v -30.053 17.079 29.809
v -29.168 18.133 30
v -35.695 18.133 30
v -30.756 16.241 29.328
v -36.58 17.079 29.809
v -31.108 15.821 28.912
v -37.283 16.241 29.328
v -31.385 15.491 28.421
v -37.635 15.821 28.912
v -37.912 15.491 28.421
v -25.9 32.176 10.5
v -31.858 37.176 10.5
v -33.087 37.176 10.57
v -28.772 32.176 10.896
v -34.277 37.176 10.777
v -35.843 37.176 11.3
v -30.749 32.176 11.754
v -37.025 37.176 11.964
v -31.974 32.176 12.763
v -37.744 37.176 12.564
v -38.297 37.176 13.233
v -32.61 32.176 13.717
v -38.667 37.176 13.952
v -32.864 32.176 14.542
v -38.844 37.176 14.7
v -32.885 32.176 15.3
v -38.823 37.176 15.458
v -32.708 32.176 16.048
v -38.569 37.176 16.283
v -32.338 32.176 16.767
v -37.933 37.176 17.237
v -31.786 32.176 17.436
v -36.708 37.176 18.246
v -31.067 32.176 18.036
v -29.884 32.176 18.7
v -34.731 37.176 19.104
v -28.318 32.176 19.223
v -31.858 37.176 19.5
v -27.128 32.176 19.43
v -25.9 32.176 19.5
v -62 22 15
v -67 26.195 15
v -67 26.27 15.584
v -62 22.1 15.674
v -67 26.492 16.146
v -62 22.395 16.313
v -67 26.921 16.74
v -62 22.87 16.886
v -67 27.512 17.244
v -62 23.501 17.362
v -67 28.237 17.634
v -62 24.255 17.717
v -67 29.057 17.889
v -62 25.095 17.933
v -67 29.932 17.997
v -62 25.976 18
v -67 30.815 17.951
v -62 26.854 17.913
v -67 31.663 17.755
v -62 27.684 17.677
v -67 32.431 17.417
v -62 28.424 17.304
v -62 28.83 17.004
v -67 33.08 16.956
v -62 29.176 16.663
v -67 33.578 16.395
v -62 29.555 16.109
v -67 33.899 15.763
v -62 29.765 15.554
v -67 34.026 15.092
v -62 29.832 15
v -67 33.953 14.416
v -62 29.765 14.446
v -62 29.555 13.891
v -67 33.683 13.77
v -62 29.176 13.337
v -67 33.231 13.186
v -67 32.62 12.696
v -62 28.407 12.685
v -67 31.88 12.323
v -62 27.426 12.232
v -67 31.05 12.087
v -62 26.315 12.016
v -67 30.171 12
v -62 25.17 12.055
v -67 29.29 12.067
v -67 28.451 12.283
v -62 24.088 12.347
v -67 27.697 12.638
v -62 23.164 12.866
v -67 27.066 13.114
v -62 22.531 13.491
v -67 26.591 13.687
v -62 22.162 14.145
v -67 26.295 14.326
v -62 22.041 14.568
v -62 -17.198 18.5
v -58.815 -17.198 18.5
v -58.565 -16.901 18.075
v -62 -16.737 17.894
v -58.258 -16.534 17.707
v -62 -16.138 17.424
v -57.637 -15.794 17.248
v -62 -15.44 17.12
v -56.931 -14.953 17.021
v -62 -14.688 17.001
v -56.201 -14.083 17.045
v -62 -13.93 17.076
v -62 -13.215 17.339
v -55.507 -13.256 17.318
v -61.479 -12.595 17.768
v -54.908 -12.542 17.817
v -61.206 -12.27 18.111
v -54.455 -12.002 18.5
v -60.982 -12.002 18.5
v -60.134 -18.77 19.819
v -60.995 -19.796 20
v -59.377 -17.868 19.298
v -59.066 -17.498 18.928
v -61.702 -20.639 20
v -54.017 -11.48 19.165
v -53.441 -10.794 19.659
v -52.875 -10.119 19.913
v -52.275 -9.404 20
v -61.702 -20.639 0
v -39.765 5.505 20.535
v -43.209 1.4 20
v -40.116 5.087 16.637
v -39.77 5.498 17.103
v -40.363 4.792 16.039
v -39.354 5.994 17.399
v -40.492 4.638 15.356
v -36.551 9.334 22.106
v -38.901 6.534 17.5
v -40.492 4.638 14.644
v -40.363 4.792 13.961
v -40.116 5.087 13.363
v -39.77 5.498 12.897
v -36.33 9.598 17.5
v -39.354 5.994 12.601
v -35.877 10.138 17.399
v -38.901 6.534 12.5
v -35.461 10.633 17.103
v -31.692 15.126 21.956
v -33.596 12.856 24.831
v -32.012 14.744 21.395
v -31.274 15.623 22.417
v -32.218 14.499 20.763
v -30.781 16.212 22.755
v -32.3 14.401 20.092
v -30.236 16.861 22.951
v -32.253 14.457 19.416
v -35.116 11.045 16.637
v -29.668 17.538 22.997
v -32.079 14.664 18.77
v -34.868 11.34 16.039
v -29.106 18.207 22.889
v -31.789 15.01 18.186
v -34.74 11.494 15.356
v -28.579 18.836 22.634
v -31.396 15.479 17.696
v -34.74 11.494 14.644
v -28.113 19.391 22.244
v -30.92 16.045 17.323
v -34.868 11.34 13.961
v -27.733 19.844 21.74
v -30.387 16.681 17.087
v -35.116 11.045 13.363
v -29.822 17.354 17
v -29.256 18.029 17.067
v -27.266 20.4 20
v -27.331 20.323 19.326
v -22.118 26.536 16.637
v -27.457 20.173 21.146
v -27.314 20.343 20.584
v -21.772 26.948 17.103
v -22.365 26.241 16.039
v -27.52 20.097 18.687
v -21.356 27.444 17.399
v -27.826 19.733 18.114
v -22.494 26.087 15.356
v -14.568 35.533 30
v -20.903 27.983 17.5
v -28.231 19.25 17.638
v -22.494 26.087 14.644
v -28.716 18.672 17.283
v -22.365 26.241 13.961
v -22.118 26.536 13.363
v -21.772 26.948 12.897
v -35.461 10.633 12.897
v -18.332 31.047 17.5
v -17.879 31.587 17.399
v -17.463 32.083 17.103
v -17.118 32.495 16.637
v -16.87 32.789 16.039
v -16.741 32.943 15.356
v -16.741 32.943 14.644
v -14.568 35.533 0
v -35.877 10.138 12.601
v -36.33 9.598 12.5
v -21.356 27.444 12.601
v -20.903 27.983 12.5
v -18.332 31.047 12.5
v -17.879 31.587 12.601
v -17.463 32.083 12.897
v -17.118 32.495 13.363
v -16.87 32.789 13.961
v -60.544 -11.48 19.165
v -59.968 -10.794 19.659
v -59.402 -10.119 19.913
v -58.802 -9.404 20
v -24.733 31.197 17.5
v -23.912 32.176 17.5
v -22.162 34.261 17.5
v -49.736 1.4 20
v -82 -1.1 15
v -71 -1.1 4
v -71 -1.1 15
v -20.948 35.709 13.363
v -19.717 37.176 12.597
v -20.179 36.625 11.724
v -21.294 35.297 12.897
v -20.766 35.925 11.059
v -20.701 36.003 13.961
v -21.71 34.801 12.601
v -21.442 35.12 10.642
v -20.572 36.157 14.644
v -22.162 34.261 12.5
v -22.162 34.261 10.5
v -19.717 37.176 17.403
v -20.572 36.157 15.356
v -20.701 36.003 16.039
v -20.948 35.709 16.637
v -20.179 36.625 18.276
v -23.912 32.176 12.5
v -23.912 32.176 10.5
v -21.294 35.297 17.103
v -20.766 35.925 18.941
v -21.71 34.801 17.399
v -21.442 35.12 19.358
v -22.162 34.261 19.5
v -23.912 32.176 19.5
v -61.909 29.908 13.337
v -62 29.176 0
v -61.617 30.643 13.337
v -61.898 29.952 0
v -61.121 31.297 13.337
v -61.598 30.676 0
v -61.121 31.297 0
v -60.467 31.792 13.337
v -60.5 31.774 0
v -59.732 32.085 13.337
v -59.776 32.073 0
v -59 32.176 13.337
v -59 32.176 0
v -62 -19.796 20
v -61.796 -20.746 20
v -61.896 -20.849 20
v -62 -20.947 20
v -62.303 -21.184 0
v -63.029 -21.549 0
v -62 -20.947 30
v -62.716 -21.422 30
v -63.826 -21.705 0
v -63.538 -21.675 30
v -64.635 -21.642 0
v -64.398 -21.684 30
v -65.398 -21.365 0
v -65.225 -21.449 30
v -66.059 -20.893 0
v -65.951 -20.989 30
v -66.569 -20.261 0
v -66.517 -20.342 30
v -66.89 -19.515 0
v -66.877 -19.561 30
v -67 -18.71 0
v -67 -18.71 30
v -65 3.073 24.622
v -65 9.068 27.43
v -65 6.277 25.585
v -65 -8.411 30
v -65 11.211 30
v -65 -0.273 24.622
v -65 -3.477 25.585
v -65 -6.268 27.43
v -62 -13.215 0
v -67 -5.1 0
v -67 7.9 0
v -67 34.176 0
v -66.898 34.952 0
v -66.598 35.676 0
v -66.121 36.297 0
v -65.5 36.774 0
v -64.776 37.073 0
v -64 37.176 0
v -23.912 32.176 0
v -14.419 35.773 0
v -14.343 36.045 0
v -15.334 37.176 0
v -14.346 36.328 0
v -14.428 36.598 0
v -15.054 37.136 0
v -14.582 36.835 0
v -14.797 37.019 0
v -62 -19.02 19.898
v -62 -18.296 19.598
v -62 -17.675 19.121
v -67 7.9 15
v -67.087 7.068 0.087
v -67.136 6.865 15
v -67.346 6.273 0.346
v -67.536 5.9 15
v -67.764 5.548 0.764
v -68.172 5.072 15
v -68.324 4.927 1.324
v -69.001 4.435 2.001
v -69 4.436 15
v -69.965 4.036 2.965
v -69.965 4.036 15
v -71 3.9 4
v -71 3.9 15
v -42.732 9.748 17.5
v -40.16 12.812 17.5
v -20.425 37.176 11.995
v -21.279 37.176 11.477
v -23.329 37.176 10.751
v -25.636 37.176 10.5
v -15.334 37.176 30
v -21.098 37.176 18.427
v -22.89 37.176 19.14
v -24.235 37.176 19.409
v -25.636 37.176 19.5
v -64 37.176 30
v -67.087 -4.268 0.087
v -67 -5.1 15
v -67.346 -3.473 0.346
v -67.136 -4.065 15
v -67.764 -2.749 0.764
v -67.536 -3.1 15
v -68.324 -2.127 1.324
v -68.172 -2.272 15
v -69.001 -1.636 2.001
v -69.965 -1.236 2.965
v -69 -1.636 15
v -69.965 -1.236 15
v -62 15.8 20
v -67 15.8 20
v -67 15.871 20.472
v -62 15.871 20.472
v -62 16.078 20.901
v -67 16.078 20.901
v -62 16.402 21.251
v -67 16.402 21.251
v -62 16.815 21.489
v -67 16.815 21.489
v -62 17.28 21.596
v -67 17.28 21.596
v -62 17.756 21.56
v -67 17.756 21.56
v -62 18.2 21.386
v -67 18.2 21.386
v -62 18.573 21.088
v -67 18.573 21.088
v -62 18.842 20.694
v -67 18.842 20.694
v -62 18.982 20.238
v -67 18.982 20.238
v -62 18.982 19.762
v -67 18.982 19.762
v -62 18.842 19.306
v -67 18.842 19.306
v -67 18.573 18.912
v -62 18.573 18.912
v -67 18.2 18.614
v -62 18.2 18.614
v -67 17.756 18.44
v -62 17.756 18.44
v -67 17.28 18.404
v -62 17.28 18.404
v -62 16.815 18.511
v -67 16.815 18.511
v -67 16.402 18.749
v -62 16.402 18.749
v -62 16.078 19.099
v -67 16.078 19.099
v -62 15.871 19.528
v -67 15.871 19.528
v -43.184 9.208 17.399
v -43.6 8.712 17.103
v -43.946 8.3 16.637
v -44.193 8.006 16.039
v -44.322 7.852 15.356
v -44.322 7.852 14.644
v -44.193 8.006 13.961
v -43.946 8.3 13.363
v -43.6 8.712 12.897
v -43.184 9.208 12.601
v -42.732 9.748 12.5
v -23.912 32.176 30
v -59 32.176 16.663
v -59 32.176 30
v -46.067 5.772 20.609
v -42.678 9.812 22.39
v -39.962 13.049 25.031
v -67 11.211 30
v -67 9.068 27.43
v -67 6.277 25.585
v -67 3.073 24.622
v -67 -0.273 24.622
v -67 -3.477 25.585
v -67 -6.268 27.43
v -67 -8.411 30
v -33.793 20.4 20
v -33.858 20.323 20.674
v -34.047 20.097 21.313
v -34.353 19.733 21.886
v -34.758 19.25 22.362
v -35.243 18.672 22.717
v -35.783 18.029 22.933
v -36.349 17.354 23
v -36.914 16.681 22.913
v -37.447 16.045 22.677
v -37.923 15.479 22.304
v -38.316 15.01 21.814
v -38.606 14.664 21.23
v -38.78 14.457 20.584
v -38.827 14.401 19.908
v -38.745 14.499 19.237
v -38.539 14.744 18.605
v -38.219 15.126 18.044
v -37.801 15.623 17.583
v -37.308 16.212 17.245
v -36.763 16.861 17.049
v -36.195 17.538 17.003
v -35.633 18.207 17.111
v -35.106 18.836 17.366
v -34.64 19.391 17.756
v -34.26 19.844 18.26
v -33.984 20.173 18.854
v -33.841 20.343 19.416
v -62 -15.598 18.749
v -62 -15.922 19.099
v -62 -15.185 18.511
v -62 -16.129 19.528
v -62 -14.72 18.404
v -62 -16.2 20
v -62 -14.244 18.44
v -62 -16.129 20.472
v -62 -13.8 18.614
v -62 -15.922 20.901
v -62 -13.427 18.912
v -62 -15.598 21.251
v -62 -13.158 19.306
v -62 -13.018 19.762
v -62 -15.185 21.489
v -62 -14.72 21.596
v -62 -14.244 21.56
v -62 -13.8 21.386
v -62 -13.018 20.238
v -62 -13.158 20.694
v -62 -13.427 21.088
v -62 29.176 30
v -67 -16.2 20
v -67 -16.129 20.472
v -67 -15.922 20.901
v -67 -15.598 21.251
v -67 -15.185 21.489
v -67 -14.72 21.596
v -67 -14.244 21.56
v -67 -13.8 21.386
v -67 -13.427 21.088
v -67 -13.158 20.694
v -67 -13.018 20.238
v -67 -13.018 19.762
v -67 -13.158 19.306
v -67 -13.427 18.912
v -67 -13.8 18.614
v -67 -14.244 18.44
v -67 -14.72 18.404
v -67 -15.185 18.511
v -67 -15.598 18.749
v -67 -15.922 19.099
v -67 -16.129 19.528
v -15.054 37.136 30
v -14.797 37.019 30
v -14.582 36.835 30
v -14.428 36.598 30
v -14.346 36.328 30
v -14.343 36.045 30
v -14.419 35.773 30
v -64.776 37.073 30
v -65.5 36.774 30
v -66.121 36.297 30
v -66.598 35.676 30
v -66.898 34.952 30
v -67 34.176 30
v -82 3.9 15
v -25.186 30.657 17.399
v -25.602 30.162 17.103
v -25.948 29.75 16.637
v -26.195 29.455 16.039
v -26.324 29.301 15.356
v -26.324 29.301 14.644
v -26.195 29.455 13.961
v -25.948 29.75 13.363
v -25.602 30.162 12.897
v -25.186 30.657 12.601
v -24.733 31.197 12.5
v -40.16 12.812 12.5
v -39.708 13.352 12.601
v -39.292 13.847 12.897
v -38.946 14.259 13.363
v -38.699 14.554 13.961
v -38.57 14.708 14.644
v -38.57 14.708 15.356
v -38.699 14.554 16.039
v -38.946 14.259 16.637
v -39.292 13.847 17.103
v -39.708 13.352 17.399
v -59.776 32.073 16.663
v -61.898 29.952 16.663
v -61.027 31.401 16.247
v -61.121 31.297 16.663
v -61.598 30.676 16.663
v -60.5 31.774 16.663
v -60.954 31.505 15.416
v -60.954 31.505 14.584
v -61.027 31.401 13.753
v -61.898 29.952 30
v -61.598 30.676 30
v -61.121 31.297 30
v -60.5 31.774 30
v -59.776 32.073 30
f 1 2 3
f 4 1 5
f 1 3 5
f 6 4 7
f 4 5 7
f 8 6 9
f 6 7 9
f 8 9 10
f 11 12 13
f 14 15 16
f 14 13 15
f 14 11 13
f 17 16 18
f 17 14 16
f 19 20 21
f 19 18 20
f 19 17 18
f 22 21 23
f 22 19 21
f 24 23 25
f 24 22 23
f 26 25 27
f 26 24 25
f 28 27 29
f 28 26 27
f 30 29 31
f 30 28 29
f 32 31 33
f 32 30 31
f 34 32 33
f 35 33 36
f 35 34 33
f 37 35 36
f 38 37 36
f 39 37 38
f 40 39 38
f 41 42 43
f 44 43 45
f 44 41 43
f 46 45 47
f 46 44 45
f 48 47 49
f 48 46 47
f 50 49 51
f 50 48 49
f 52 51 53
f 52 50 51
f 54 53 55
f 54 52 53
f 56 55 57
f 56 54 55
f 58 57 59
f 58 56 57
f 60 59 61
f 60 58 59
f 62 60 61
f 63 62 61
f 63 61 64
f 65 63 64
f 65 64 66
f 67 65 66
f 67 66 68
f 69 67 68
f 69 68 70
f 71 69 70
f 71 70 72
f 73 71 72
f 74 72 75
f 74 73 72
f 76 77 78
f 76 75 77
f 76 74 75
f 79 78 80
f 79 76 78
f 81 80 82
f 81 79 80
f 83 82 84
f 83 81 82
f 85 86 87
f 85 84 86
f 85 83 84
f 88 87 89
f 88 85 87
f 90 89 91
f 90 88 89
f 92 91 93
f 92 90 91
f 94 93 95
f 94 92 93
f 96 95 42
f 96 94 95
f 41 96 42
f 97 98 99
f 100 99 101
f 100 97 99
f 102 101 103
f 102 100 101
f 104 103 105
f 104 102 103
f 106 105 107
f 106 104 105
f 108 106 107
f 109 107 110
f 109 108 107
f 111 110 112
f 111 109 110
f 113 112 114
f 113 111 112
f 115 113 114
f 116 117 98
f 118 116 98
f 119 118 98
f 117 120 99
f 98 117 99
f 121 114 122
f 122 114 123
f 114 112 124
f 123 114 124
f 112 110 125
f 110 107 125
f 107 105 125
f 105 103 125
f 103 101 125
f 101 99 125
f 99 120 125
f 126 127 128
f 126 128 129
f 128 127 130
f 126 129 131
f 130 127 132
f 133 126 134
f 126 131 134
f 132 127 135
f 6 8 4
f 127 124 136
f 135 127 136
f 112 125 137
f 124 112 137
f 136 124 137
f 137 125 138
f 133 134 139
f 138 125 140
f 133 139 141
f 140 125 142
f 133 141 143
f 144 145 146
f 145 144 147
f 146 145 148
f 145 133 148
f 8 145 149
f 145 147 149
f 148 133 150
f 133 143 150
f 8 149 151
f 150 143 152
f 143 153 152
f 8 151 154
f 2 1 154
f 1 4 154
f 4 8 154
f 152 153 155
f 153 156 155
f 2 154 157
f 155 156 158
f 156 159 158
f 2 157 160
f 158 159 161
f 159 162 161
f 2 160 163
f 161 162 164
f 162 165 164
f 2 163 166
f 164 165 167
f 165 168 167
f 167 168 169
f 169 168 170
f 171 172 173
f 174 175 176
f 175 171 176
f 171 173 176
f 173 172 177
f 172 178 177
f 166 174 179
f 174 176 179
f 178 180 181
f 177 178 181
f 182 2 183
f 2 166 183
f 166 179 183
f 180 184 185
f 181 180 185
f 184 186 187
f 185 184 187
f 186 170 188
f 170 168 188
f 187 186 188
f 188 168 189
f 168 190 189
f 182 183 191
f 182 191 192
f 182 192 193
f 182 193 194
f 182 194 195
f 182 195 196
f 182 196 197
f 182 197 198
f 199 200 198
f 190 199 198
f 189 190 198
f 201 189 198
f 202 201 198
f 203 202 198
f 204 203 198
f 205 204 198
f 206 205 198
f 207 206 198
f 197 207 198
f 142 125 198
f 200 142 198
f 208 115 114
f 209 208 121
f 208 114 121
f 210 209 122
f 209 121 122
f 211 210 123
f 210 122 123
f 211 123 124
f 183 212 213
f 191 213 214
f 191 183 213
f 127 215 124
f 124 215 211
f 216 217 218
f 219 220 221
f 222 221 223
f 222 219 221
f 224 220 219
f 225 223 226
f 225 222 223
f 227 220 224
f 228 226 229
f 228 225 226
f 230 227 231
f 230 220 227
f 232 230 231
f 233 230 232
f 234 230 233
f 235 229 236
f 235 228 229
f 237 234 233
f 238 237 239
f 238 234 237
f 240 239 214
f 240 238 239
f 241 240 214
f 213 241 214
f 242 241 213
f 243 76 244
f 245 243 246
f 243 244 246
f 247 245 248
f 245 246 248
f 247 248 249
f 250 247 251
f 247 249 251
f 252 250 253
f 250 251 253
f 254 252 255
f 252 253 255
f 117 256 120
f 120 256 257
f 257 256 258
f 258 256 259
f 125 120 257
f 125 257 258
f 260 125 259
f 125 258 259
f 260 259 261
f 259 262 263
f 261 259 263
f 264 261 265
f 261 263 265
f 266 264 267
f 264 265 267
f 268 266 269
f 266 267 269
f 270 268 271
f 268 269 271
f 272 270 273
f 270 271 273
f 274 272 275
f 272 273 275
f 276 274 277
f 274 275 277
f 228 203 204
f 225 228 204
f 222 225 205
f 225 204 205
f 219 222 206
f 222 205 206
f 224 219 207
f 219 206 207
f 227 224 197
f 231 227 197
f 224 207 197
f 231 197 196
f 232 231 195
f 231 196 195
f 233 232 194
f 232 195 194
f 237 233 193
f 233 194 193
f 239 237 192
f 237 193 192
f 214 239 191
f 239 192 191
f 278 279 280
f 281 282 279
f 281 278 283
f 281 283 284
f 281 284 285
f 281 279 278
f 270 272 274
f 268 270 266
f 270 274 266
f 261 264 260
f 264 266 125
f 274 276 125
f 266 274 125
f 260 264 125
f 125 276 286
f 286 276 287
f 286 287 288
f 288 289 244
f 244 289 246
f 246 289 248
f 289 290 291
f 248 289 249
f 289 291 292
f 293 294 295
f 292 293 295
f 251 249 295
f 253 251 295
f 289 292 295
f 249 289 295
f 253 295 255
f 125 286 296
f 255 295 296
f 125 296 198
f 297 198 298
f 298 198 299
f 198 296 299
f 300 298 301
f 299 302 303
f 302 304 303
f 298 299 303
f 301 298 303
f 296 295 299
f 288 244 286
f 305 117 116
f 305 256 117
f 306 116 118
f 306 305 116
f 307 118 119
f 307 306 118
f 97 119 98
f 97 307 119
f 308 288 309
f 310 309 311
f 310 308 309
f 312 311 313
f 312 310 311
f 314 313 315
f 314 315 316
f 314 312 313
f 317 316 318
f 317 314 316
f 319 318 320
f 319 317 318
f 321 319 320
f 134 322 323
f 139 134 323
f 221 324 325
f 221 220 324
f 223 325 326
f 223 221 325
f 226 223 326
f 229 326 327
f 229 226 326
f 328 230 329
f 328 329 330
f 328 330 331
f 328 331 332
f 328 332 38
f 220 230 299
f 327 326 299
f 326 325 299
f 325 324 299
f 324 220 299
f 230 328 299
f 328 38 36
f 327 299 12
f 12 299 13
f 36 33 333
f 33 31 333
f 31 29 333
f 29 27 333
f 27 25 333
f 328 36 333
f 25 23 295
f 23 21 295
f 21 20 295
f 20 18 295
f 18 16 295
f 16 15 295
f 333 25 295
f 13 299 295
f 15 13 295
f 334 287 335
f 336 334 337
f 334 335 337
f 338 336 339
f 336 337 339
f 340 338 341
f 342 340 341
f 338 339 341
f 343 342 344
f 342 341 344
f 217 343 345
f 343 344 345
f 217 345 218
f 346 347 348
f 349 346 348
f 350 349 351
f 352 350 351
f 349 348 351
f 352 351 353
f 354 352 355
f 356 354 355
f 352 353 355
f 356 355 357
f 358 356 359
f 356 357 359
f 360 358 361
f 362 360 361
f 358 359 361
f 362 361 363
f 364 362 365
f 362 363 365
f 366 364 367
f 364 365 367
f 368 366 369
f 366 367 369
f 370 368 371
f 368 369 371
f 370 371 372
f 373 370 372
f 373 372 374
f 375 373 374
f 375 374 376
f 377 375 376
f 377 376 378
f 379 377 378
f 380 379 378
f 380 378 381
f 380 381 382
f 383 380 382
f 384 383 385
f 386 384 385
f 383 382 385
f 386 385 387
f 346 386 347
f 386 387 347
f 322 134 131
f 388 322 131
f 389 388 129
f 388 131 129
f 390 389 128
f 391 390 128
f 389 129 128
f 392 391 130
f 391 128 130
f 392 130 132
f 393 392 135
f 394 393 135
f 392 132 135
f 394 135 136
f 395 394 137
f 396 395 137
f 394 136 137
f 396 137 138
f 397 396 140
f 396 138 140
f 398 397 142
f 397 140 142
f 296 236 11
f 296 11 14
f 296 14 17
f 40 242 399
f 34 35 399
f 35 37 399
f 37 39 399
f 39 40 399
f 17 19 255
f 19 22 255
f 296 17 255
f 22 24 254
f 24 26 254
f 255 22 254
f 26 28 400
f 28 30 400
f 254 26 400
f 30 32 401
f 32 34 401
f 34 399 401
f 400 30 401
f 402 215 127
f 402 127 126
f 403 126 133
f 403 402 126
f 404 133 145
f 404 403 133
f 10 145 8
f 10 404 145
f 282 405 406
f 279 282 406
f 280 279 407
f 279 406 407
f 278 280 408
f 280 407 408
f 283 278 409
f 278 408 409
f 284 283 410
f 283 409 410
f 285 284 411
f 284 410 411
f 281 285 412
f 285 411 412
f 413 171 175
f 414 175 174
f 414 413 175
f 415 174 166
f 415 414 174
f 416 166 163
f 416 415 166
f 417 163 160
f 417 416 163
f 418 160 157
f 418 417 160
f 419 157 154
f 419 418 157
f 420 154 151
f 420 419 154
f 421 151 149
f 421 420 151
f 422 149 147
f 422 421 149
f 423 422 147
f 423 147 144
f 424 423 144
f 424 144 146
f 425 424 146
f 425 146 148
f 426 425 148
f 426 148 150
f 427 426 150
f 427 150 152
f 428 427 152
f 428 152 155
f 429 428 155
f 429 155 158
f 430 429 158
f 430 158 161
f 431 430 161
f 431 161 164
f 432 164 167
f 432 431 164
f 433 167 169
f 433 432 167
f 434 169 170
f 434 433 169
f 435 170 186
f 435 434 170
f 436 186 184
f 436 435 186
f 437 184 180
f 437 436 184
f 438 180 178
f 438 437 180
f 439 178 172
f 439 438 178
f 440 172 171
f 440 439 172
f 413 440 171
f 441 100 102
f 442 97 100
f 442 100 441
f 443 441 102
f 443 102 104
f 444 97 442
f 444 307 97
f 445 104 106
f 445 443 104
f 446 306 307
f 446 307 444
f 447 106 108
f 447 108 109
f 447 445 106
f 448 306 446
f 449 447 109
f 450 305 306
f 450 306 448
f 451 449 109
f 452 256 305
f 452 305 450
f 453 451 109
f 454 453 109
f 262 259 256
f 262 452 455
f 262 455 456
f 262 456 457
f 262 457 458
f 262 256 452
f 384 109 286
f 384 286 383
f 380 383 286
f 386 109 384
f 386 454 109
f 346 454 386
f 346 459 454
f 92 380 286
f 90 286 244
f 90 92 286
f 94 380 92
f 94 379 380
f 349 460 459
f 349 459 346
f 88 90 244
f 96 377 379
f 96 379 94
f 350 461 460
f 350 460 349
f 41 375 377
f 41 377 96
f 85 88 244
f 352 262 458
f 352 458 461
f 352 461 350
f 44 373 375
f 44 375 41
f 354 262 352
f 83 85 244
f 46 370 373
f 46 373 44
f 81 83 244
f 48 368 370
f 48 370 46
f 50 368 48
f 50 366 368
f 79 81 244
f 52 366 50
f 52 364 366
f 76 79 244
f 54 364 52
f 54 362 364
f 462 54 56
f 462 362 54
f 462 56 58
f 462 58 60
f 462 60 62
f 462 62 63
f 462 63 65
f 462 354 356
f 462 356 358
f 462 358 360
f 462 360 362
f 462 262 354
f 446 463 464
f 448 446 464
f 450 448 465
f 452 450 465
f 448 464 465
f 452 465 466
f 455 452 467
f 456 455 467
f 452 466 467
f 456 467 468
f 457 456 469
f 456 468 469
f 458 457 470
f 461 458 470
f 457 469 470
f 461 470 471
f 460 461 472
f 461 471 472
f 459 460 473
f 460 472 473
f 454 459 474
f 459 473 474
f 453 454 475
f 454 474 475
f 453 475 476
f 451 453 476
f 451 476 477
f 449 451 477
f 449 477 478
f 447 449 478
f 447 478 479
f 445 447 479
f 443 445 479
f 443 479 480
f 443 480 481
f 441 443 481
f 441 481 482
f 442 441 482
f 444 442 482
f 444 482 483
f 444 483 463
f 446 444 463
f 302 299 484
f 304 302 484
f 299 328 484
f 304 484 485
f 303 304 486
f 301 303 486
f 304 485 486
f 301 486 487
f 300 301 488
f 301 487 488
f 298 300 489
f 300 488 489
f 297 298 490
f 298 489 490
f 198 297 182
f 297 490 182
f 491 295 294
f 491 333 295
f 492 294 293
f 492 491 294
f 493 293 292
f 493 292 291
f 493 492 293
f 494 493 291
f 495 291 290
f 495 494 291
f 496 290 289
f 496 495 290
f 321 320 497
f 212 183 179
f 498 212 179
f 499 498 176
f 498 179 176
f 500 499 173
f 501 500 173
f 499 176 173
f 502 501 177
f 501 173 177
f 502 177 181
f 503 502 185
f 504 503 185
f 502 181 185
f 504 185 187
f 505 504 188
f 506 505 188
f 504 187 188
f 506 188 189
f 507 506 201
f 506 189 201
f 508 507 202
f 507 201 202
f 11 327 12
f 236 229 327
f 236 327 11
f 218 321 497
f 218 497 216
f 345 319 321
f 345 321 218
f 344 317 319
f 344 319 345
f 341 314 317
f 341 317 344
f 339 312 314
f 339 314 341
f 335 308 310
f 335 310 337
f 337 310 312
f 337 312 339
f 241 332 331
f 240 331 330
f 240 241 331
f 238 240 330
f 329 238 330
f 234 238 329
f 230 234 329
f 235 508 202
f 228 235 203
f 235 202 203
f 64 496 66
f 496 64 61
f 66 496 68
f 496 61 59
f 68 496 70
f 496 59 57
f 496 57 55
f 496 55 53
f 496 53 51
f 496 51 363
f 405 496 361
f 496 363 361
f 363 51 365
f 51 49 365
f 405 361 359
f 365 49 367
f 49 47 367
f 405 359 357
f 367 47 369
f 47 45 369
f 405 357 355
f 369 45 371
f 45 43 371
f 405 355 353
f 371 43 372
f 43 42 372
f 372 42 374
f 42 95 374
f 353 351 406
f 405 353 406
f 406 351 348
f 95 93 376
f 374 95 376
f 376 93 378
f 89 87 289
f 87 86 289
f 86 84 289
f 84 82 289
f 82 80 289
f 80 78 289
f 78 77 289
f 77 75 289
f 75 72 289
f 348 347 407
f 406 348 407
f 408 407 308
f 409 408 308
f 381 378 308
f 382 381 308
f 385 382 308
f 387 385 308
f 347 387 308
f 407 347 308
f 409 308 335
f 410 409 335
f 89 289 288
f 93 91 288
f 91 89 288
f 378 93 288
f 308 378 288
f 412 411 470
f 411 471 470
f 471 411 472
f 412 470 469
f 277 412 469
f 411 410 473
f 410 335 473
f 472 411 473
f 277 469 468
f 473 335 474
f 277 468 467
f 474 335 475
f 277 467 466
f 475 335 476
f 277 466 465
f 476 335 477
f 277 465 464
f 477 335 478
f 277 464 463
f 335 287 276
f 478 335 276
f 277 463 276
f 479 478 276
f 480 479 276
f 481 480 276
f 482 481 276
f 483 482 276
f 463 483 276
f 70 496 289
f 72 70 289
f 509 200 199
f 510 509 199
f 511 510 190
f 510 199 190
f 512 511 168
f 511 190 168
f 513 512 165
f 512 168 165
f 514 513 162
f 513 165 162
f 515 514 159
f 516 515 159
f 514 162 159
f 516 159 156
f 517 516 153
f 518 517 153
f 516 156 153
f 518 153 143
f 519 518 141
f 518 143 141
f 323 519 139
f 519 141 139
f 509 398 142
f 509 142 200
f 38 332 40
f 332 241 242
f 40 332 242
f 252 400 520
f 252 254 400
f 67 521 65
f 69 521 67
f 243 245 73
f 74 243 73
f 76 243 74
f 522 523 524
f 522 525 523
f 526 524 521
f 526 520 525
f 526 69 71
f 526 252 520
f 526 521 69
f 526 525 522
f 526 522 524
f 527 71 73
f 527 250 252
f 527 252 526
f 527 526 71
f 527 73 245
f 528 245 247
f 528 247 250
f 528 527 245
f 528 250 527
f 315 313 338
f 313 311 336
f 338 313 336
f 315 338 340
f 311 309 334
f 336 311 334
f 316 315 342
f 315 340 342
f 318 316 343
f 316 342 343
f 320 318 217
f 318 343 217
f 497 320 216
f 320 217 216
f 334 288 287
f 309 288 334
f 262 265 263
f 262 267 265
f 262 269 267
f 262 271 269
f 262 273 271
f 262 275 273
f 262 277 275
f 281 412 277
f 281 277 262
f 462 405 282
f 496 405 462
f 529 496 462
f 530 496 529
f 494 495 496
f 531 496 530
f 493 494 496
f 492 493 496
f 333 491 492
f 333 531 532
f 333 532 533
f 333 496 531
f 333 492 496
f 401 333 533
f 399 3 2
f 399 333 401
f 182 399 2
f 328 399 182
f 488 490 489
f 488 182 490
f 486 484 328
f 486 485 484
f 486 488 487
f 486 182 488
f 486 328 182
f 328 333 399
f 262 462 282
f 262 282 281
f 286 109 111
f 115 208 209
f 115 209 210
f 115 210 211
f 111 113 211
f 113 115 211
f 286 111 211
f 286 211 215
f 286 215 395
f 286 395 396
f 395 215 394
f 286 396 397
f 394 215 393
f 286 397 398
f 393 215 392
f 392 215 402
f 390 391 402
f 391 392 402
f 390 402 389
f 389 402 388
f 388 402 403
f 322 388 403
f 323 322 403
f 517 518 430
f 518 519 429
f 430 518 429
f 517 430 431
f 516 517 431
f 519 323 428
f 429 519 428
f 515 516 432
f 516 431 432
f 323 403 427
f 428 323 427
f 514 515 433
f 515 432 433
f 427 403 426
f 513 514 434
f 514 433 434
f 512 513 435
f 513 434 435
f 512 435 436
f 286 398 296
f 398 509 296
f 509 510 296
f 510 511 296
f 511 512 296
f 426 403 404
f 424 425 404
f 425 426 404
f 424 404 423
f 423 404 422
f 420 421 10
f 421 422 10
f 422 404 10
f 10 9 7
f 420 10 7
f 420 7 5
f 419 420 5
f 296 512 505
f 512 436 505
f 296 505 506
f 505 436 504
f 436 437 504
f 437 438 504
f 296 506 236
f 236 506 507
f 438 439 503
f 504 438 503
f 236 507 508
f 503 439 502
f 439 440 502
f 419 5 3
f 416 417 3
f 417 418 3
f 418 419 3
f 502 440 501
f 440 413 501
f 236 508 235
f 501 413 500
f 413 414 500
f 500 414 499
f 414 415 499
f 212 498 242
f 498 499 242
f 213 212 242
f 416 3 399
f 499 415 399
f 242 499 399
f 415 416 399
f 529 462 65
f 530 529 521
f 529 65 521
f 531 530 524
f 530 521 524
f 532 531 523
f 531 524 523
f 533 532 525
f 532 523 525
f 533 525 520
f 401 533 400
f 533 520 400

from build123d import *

# Parameters (mm, degrees)
PAD_DEPTH       = 30
POCKET_DEPTH    = 30
POCKET001_DEPTH = 5
SKETCH012_R     = 3
POCKET002_DEPTH = 36.2220150744
SKETCH004_R     = 11.5
POCKET003_DEPTH = 2
SKETCH005_R     = 1.6
POCKET004_DEPTH = 5
SKETCH017_R     = 3
POCKET005_DEPTH = 48.8112135518
POCKET006_DEPTH = 48.8112135518
SKETCH019_W     = 5
SKETCH019_H     = 15
PAD001_DEPTH    = 15
POCKET007_DEPTH = 38.2766814448
FILLET_R        = 3
FILLET001_R     = 3
FILLET002_R     = 3
FILLET003_R     = 3
FILLET004_R     = 4
FILLET005_R     = 1


with BuildPart() as part:
    # Sketch → Pad (new body)
    with BuildSketch(Plane.XY):
        Polygon((-67, -15.6), (-67, -26.9528805906), (-13.1897864482, 37.175634728), (-67, 37.175634728), align=None)
    extrude(amount=PAD_DEPTH)

    # Sketch001 → Pocket (cut)
    with BuildSketch(Plane.XY.offset(30)):
        Polygon((-62, 32.175634728), (-62, -13.2154934933), (-23.9123210508, 32.175634728), align=None)
    extrude(amount=-POCKET_DEPTH, mode=Mode.SUBTRACT)

    # Sketch002 → Pocket001 (cut)
    with BuildSketch(Plane(origin=(-26.045511066, 21.8547787293, 0), x_dir=(0.6427876097, 0.7660444431, 0), z_dir=(0.7660444431, -0.6427876097, 0))):
        with BuildLine():
            ThreePointArc((7.9999570995, 17.5), (5.4999570995, 15), (7.9999570995, 12.5))
            Line((7.9999570995, 12.5), (11.9999570995, 12.5))
            ThreePointArc((11.9999570995, 12.5), (14.4999570995, 15), (11.9999570995, 17.5))
            Line((7.9999570995, 17.5), (11.9999570995, 17.5))
        make_face()
        with BuildLine():
            ThreePointArc((-20.0000429005, 17.5), (-22.5000429005, 15), (-20.0000429005, 12.5))
            Line((-20.0000429005, 12.5), (-16.0000429005, 12.5))
            ThreePointArc((-16.0000429005, 12.5), (-13.5000429005, 15), (-16.0000429005, 17.5))
            Line((-20.0000429005, 17.5), (-16.0000429005, 17.5))
        make_face()
    extrude(amount=-POCKET001_DEPTH, mode=Mode.SUBTRACT)

    # Sketch012 → Pocket002 (cut, through all)
    with BuildSketch(Plane(origin=(-29.8757332816, 25.0687167778, 0), x_dir=(-0.6427876097, -0.7660444431, 0), z_dir=(-0.7660444431, 0.6427876097, 0))):
        with Locations((20.0000429005, 15)):
            Circle(SKETCH012_R)
        with BuildLine():
            ThreePointArc((-11.9999570995, 19.5), (-16.4999570995, 15), (-11.9999570995, 10.5))
            Line((-11.9999570995, 10.5), (-7.9999570995, 10.5))
            ThreePointArc((-7.9999570995, 10.5), (-3.4999570995, 15), (-7.9999570995, 19.5))
            Line((-11.9999570995, 19.5), (-7.9999570995, 19.5))
        make_face()
    extrude(amount=POCKET002_DEPTH, mode=Mode.SUBTRACT)

    # Sketch004 → Pocket003 (cut)
    with BuildSketch(Plane(origin=(-67, 0, 0), x_dir=(0, -1, 0), z_dir=(-1, 0, 0))):
        with Locations((-1.4, 36)):
            Circle(SKETCH004_R)
    extrude(amount=-POCKET003_DEPTH, mode=Mode.SUBTRACT)

    # Sketch005 → Pocket004 (cut)
    with BuildSketch(Plane(origin=(-67, 0, 0), x_dir=(0, -1, 0), z_dir=(-1, 0, 0))):
        with Locations((-17.4, 20)):
            Circle(SKETCH005_R)
        with Locations((14.6, 20)):
            Circle(SKETCH005_R)
    extrude(amount=-POCKET004_DEPTH, mode=Mode.SUBTRACT)

    # Sketch017 → Pocket005 (cut, through all)
    with BuildSketch(Plane.YZ.offset(-62)):
        with Locations((-14.6, 20)):
            Circle(SKETCH017_R)
        with Locations((17.4, 20)):
            Circle(SKETCH017_R)
    extrude(amount=POCKET005_DEPTH, mode=Mode.SUBTRACT)

    # Sketch018 → Pocket006 (cut, through all)
    with BuildSketch(Plane.YZ.offset(-62)):
        with BuildLine():
            ThreePointArc((1.4000345084, 20), (16.63877916, 40.8764341185), (-7.88883473, 49.02756882))
            Line((-48.5999654916, 20), (-7.88883473, 49.02756882))
            Line((1.4000345084, 20), (-48.5999654916, 20))
        make_face()
    extrude(amount=POCKET006_DEPTH, mode=Mode.SUBTRACT)

    # Sketch019 → Pad001 (new body)
    with BuildSketch(Plane(origin=(-67, 0, 0), x_dir=(0, -1, 0), z_dir=(-1, 0, 0))):
        with Locations((-1.3999532833, 7.5)):
            Rectangle(SKETCH019_W, SKETCH019_H)
    extrude(amount=PAD001_DEPTH)

    # Sketch020 → Pocket007 (cut, through all)
    with BuildSketch(Plane.XZ.offset(1.1000467167)):
        Polygon((-82, 15), (-82, 0), (-67, 0), align=None)
    extrude(amount=-POCKET007_DEPTH, mode=Mode.SUBTRACT)

    # Fillet
    fillet_edges = [part.edges().sort_by_distance(p)[0] for p in [
        (-67, -26.952881, 15),
    ]]
    fillet(fillet_edges, radius=FILLET_R)

    # Fillet001
    fillet001_edges = [part.edges().sort_by_distance(p)[0] for p in [
        (-67, 37.175635, 15),
    ]]
    fillet(fillet001_edges, radius=FILLET001_R)

    # Fillet002
    fillet002_edges = [part.edges().sort_by_distance(p)[0] for p in [
        (-62, 32.175635, 15),
    ]]
    fillet(fillet002_edges, radius=FILLET002_R)

    # Fillet003
    fillet003_edges = [part.edges().sort_by_distance(p)[0] for p in [
        (-60.576001, -17.6, 20),
        (-57.380922, -11.6, 20),
        (-34.026768, 16.232397, 30),
    ]]
    fillet(fillet003_edges, radius=FILLET003_R)

    # Fillet004
    fillet004_edges = [part.edges().sort_by_distance(p)[0] for p in [
        (-67, -1.100047, 7.5),
        (-67, 3.899953, 7.5),
    ]]
    fillet(fillet004_edges, radius=FILLET004_R)

    # Fillet005
    fillet005_edges = [part.edges().sort_by_distance(p)[0] for p in [
        (-13.189786, 37.175635, 15),
    ]]
    fillet(fillet005_edges, radius=FILLET005_R)


solid = part.part
